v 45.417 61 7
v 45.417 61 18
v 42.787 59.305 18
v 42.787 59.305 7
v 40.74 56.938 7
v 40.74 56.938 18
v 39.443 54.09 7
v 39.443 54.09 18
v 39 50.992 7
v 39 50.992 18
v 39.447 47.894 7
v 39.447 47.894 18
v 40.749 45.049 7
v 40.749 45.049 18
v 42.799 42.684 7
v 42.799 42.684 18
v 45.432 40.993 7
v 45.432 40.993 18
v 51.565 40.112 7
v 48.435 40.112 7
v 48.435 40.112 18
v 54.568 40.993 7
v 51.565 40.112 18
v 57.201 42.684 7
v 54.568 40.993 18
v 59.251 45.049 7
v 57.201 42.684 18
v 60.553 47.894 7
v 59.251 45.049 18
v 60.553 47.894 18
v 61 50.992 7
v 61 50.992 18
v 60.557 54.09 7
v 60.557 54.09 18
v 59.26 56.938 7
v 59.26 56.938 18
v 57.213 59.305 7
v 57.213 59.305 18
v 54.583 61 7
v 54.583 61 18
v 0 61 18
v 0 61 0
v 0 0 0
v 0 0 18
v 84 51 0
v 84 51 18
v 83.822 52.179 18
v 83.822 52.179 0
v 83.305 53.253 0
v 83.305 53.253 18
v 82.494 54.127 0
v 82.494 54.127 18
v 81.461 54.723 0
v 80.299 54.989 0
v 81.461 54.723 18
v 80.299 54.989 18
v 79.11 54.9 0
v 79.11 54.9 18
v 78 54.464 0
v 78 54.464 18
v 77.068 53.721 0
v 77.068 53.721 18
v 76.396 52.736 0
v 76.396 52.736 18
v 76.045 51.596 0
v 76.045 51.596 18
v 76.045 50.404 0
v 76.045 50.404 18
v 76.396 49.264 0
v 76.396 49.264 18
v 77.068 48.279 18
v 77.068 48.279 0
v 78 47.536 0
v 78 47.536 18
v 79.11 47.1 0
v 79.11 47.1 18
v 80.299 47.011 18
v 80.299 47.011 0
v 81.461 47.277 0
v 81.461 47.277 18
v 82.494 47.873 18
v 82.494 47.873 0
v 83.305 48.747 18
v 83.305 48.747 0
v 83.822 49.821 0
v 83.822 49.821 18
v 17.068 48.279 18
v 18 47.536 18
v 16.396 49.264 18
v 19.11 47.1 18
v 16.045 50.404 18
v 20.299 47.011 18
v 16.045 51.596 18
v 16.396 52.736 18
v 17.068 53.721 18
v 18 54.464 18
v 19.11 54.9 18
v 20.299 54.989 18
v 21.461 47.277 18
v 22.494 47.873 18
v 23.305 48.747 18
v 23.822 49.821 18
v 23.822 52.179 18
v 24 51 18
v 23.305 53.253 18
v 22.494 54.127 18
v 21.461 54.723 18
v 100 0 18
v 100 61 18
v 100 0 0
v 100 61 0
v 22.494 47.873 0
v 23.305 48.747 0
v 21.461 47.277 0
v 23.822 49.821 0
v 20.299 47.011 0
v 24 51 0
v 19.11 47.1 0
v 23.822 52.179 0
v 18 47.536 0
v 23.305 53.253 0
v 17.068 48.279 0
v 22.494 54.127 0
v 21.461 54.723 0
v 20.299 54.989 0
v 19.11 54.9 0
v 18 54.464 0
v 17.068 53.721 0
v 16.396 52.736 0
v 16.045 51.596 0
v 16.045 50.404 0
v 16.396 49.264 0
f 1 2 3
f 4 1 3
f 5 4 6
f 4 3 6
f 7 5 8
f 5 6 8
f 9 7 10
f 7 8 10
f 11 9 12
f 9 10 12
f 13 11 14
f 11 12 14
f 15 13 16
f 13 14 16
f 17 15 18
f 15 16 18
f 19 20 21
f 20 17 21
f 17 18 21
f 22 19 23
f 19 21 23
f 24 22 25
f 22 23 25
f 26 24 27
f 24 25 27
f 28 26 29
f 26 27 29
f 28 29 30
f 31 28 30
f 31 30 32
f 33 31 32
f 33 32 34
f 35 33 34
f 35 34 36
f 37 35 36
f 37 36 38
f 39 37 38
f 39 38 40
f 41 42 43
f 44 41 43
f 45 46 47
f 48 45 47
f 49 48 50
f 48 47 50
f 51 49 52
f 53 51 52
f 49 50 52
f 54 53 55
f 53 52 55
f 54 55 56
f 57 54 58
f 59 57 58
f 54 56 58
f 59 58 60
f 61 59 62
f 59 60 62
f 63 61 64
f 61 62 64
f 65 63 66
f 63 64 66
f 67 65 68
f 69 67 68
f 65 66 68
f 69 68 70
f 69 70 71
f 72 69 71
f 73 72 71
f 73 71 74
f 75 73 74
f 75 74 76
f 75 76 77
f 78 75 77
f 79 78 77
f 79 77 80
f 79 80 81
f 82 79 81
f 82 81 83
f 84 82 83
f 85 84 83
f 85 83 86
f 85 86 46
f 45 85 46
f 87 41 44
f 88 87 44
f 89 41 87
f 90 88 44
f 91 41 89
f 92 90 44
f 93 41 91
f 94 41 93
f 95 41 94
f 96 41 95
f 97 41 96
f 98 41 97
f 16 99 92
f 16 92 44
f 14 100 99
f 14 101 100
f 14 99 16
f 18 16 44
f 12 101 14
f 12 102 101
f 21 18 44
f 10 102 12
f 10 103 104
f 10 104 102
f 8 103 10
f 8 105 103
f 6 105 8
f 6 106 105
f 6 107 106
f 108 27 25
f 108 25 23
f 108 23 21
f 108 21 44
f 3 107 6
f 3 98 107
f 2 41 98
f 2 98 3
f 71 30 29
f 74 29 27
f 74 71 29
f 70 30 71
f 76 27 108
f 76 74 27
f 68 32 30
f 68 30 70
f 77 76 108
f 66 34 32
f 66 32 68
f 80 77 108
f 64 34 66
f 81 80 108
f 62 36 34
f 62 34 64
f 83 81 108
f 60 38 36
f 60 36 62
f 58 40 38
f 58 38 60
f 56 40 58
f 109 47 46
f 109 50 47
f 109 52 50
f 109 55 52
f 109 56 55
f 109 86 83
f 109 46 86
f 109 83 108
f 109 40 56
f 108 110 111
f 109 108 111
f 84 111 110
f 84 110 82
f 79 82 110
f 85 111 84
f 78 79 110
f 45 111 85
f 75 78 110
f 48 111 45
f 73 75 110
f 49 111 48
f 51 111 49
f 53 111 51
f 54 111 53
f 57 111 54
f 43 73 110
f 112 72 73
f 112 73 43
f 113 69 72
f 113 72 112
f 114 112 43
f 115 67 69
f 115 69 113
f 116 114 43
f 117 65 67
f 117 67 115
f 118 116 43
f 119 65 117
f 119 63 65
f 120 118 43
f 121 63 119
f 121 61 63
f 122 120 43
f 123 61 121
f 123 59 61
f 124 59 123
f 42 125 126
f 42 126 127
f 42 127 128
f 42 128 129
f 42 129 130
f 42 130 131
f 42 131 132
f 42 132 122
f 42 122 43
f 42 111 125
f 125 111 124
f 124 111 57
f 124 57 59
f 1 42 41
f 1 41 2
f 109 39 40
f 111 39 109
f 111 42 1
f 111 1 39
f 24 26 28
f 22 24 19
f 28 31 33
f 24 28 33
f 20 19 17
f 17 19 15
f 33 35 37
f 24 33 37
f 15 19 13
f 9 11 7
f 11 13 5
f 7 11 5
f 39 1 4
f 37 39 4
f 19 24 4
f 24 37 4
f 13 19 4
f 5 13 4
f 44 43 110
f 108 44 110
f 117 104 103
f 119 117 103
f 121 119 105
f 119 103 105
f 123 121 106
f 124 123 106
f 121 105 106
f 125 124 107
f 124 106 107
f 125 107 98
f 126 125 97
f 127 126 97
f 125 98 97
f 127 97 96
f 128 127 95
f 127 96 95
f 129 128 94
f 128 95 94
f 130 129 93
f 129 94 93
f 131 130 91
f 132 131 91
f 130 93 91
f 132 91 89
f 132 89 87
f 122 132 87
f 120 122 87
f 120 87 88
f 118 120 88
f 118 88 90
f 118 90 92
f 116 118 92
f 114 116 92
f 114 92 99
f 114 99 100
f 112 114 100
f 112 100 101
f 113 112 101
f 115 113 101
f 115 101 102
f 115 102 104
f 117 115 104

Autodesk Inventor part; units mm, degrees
ref_plane "YZ Plane" through (0, 0, 0) normal (1, 0, 0) x (0, 1, 0)
ref_plane "XZ Plane" through (0, 0, 0) normal (0, 1, 0) x (-1, 0, 0)
ref_plane "XY Plane" through (0, 0, 0) normal (0, 0, 1) x (1, 0, 0)
sketch "Boceto1" plane through (0, 0, 0) normal (0, 0, 1) x (1, 0, 0)
  line L0 (0, 0) -> (100, 0)
  line L1 (100, 0) -> (100, 61)
  line L2 (100, 61) -> (0, 61)
  line L3 (0, 61) -> (0, 0)
  dimension "d0" = 61
  dimension "d1" = 100
extrude "Extrusión1" add sketch "Boceto1" along normal blind 18
sketch "Boceto2" plane through (0, 0, 18) normal (0, 0, 1) x (1, 0, 0)
  circle A0 centre (50, 51) radius 11
  line L0 (0, 61) -> (0, 0) projected
  line L1 (100, 61) -> (0, 61) projected
  line L2 (50, 51) -> (20, 51) construction
  circle A1 centre (20, 51) radius 4
  line L3 (50, 51) -> (50, 22.8333) construction
  circle A2 centre (80, 51) radius 4
  circle A3 centre (29.5218, 59.04) radius 1.5
  circle A4 centre (50, 51) radius 22 construction
  line L4 (29.5218, 59.04) -> (50, 51) construction
  line L5 (50, 51) -> (78.6691, 39.7442) construction
  circle A5 centre (70.4782, 42.96) radius 1.5
  line L6 (50, 51) -> (39.4009, 24.0037) construction
  circle A6 centre (41.96, 30.5218) radius 1.5
  point P0 (54.5826, 61)
  point P1 (45.4174, 61)
  dimension "d4" = 22
  dimension "d5" = 50
  dimension "d6" = 10
  dimension "d7" = 8
  dimension "d8" = 30
  dimension "d9" = 3
  dimension "d10" = 1.96
  dimension "d11" = 44
  dimension "d12" = 3
  dimension "d13" = 90
  dimension "d14" = 3
extrude "Extrusión2" cut sketch "Boceto2" against normal blind 18 contours A0 L1 | A1 | A2 | A3 | A6 picked at (46.6624, 53.5107)
sketch "Boceto3" plane through (0, 0, 18) normal (0, 0, 1) x (1, 0, 0)
  point P0 (0, 0)
sketch "Boceto4" plane through (0, 0, 0) normal (0, 0, -1) x (-1, 0, 0)
  arc A0 (-54.5826, 61) -> (-45.4174, 61) centre (-50, 51) ccw projected
  arc A1 (-54.5826, 61) -> (-45.4174, 61) centre (-50, 51) ccw
  circle A2 centre (-41.96, 30.5218) radius 1.5 projected
  circle A3 centre (-41.96, 30.5218) radius 1.5
  circle A4 centre (-29.5218, 59.04) radius 1.5 projected
  circle A5 centre (-29.5218, 59.04) radius 1.5
  line L0 (-45.4174, 61) -> (0, 61) projected
  line L1 (-45.4174, 61) -> (-54.5826, 61)
  point P0 (0, 0)
extrude "Extrusión3" add sketch "Boceto4" against normal blind 7 contours L1 A0
sketch "Boceto5" plane through (0, 0, 18) normal (0, 0, 1) x (1, 0, 0)
  circle A0 centre (29.5218, 59.04) radius 1.5 projected
  circle A1 centre (29.5218, 59.04) radius 1.5
  circle A2 centre (41.96, 30.5218) radius 1.5 projected
  circle A3 centre (41.96, 30.5218) radius 1.5
  point P0 (0, 0)
extrude "Extrusión4" add sketch "Boceto5" against normal up to surface (18 mm away)
properties part number "013" material "CFRP"
